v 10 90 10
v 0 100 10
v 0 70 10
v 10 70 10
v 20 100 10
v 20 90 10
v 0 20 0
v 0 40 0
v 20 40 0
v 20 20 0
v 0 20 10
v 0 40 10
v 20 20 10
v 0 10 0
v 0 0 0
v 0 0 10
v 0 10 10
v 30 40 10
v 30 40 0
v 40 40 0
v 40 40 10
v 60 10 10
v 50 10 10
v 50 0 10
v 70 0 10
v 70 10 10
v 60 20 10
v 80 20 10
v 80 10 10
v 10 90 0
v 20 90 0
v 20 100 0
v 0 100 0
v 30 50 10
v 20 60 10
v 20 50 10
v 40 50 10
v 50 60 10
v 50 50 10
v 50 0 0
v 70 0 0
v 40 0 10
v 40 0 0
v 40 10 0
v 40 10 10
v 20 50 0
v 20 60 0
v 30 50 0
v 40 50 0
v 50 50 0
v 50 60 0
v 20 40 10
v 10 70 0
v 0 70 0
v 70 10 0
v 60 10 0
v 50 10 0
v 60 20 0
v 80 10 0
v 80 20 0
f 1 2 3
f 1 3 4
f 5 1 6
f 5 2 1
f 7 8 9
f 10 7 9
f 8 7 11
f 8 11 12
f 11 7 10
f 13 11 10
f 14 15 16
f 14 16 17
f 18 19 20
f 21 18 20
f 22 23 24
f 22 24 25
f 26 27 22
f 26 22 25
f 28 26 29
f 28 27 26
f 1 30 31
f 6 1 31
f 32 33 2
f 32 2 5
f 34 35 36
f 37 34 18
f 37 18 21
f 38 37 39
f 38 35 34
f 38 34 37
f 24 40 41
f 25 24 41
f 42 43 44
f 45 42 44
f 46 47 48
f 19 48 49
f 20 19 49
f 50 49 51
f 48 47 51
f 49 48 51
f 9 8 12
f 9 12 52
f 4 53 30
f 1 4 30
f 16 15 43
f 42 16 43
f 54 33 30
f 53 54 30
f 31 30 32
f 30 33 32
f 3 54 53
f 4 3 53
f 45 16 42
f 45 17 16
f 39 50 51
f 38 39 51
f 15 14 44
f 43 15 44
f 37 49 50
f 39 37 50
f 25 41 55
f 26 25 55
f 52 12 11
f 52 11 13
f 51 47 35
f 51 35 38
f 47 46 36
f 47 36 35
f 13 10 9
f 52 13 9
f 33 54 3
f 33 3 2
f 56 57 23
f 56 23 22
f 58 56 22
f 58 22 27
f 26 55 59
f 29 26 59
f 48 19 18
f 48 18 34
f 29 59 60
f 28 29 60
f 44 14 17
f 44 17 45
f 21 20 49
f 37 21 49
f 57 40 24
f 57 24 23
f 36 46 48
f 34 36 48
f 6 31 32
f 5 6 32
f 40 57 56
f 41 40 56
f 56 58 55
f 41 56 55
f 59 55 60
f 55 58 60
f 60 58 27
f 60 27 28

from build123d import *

# Parameters (mm, degrees)
BOX001_W     = 10
BOX001_H     = 10
BOX001_DEPTH = 10
BOX002_W     = 10
BOX002_H     = 10
BOX002_DEPTH = 10
BOX003_W     = 10
BOX003_H     = 10
BOX003_DEPTH = 10
BOX_W        = 10
BOX_H        = 10
BOX_DEPTH    = 10
BOX005_W     = 10
BOX005_H     = 10
BOX005_DEPTH = 10
BOX006_W     = 10
BOX006_H     = 10
BOX006_DEPTH = 10
BOX007_W     = 10
BOX007_H     = 10
BOX007_DEPTH = 10
BOX004_W     = 10
BOX004_H     = 10
BOX004_DEPTH = 10
BOX009_W     = 10
BOX009_H     = 10
BOX009_DEPTH = 10
BOX010_W     = 10
BOX010_H     = 10
BOX010_DEPTH = 10
BOX011_W     = 10
BOX011_H     = 10
BOX011_DEPTH = 10
BOX008_W     = 10
BOX008_H     = 10
BOX008_DEPTH = 10
BOX013_W     = 10
BOX013_H     = 10
BOX013_DEPTH = 10
BOX014_W     = 10
BOX014_H     = 10
BOX014_DEPTH = 10
BOX015_W     = 10
BOX015_H     = 10
BOX015_DEPTH = 10
BOX012_W     = 10
BOX012_H     = 10
BOX012_DEPTH = 10
BOX017_W     = 10
BOX017_H     = 10
BOX017_DEPTH = 10
BOX018_W     = 10
BOX018_H     = 10
BOX018_DEPTH = 10
BOX019_W     = 10
BOX019_H     = 10
BOX019_DEPTH = 10
BOX016_W     = 10
BOX016_H     = 10
BOX016_DEPTH = 10


with BuildPart() as cube001:
    # Box001 → Box001 (new body)
    with BuildSketch(Plane(origin=(10, 0, 0), x_dir=(1, 0, 0), z_dir=(0, 0, 1))):
        with Locations((5, 5)):
            Rectangle(BOX001_W, BOX001_H)
    extrude(amount=BOX001_DEPTH)


with BuildPart() as cube002:
    # Box002 → Box002 (new body)
    with BuildSketch(Plane(origin=(20, 0, 0), x_dir=(1, 0, 0), z_dir=(0, 0, 1))):
        with Locations((5, 5)):
            Rectangle(BOX002_W, BOX002_H)
    extrude(amount=BOX002_DEPTH)


with BuildPart() as cube003:
    # Box003 → Box003 (new body)
    with BuildSketch(Plane(origin=(30, 0, 0), x_dir=(1, 0, 0), z_dir=(0, 0, 1))):
        with Locations((5, 5)):
            Rectangle(BOX003_W, BOX003_H)
    extrude(amount=BOX003_DEPTH)


with BuildPart() as fusion:
    # Box → Box (new body)
    with BuildSketch(Plane.XY):
        with Locations((5, 5)):
            Rectangle(BOX_W, BOX_H)
    extrude(amount=BOX_DEPTH)

    # Fusion: union Cube001, Cube002, Cube003
    add(cube001.part)
    add(cube002.part)
    add(cube003.part)


with BuildPart() as cube005:
    # Box005 → Box005 (new body)
    with BuildSketch(Plane(origin=(10, 20, 0), x_dir=(1, 0, 0), z_dir=(0, 0, 1))):
        with Locations((5, 5)):
            Rectangle(BOX005_W, BOX005_H)
    extrude(amount=BOX005_DEPTH)


with BuildPart() as cube006:
    # Box006 → Box006 (new body)
    with BuildSketch(Plane(origin=(0, 30, 0), x_dir=(1, 0, 0), z_dir=(0, 0, 1))):
        with Locations((5, 5)):
            Rectangle(BOX006_W, BOX006_H)
    extrude(amount=BOX006_DEPTH)


with BuildPart() as cube007:
    # Box007 → Box007 (new body)
    with BuildSketch(Plane(origin=(10, 30, 0), x_dir=(1, 0, 0), z_dir=(0, 0, 1))):
        with Locations((5, 5)):
            Rectangle(BOX007_W, BOX007_H)
    extrude(amount=BOX007_DEPTH)


with BuildPart() as fusion001:
    # Box004 → Box004 (new body)
    with BuildSketch(Plane(origin=(0, 20, 0), x_dir=(1, 0, 0), z_dir=(0, 0, 1))):
        with Locations((5, 5)):
            Rectangle(BOX004_W, BOX004_H)
    extrude(amount=BOX004_DEPTH)

    # Fusion001: union Cube005, Cube006, Cube007
    add(cube005.part)
    add(cube006.part)
    add(cube007.part)


with BuildPart() as cube009:
    # Box009 → Box009 (new body)
    with BuildSketch(Plane(origin=(60, 0, 0), x_dir=(1, 0, 0), z_dir=(0, 0, 1))):
        with Locations((5, 5)):
            Rectangle(BOX009_W, BOX009_H)
    extrude(amount=BOX009_DEPTH)


with BuildPart() as cube010:
    # Box010 → Box010 (new body)
    with BuildSketch(Plane(origin=(60, 10, 0), x_dir=(1, 0, 0), z_dir=(0, 0, 1))):
        with Locations((5, 5)):
            Rectangle(BOX010_W, BOX010_H)
    extrude(amount=BOX010_DEPTH)


with BuildPart() as cube011:
    # Box011 → Box011 (new body)
    with BuildSketch(Plane(origin=(70, 10, 0), x_dir=(1, 0, 0), z_dir=(0, 0, 1))):
        with Locations((5, 5)):
            Rectangle(BOX011_W, BOX011_H)
    extrude(amount=BOX011_DEPTH)


with BuildPart() as fusion002:
    # Box008 → Box008 (new body)
    with BuildSketch(Plane(origin=(50, 0, 0), x_dir=(1, 0, 0), z_dir=(0, 0, 1))):
        with Locations((5, 5)):
            Rectangle(BOX008_W, BOX008_H)
    extrude(amount=BOX008_DEPTH)

    # Fusion002: union Cube009, Cube010, Cube011
    add(cube009.part)
    add(cube010.part)
    add(cube011.part)


with BuildPart() as cube013:
    # Box013 → Box013 (new body)
    with BuildSketch(Plane(origin=(40, 50, 0), x_dir=(1, 0, 0), z_dir=(0, 0, 1))):
        with Locations((5, 5)):
            Rectangle(BOX013_W, BOX013_H)
    extrude(amount=BOX013_DEPTH)


with BuildPart() as cube014:
    # Box014 → Box014 (new body)
    with BuildSketch(Plane(origin=(30, 50, 0), x_dir=(1, 0, 0), z_dir=(0, 0, 1))):
        with Locations((5, 5)):
            Rectangle(BOX014_W, BOX014_H)
    extrude(amount=BOX014_DEPTH)


with BuildPart() as cube015:
    # Box015 → Box015 (new body)
    with BuildSketch(Plane(origin=(20, 50, 0), x_dir=(1, 0, 0), z_dir=(0, 0, 1))):
        with Locations((5, 5)):
            Rectangle(BOX015_W, BOX015_H)
    extrude(amount=BOX015_DEPTH)


with BuildPart() as fusion003:
    # Box012 → Box012 (new body)
    with BuildSketch(Plane(origin=(30, 40, 0), x_dir=(1, 0, 0), z_dir=(0, 0, 1))):
        with Locations((5, 5)):
            Rectangle(BOX012_W, BOX012_H)
    extrude(amount=BOX012_DEPTH)

    # Fusion003: union Cube013, Cube014, Cube015
    add(cube013.part)
    add(cube014.part)
    add(cube015.part)


with BuildPart() as cube017:
    # Box017 → Box017 (new body)
    with BuildSketch(Plane(origin=(0, 80, 0), x_dir=(1, 0, 0), z_dir=(0, 0, 1))):
        with Locations((5, 5)):
            Rectangle(BOX017_W, BOX017_H)
    extrude(amount=BOX017_DEPTH)


with BuildPart() as cube018:
    # Box018 → Box018 (new body)
    with BuildSketch(Plane(origin=(0, 90, 0), x_dir=(1, 0, 0), z_dir=(0, 0, 1))):
        with Locations((5, 5)):
            Rectangle(BOX018_W, BOX018_H)
    extrude(amount=BOX018_DEPTH)


with BuildPart() as cube019:
    # Box019 → Box019 (new body)
    with BuildSketch(Plane(origin=(10, 90, 0), x_dir=(1, 0, 0), z_dir=(0, 0, 1))):
        with Locations((5, 5)):
            Rectangle(BOX019_W, BOX019_H)
    extrude(amount=BOX019_DEPTH)


with BuildPart() as fusion004:
    # Box016 → Box016 (new body)
    with BuildSketch(Plane(origin=(0, 70, 0), x_dir=(1, 0, 0), z_dir=(0, 0, 1))):
        with Locations((5, 5)):
            Rectangle(BOX016_W, BOX016_H)
    extrude(amount=BOX016_DEPTH)

    # Fusion004: union Cube017, Cube018, Cube019
    add(cube017.part)
    add(cube018.part)
    add(cube019.part)


solid = Compound([fusion.part, fusion001.part, fusion002.part, fusion003.part, fusion004.part])
